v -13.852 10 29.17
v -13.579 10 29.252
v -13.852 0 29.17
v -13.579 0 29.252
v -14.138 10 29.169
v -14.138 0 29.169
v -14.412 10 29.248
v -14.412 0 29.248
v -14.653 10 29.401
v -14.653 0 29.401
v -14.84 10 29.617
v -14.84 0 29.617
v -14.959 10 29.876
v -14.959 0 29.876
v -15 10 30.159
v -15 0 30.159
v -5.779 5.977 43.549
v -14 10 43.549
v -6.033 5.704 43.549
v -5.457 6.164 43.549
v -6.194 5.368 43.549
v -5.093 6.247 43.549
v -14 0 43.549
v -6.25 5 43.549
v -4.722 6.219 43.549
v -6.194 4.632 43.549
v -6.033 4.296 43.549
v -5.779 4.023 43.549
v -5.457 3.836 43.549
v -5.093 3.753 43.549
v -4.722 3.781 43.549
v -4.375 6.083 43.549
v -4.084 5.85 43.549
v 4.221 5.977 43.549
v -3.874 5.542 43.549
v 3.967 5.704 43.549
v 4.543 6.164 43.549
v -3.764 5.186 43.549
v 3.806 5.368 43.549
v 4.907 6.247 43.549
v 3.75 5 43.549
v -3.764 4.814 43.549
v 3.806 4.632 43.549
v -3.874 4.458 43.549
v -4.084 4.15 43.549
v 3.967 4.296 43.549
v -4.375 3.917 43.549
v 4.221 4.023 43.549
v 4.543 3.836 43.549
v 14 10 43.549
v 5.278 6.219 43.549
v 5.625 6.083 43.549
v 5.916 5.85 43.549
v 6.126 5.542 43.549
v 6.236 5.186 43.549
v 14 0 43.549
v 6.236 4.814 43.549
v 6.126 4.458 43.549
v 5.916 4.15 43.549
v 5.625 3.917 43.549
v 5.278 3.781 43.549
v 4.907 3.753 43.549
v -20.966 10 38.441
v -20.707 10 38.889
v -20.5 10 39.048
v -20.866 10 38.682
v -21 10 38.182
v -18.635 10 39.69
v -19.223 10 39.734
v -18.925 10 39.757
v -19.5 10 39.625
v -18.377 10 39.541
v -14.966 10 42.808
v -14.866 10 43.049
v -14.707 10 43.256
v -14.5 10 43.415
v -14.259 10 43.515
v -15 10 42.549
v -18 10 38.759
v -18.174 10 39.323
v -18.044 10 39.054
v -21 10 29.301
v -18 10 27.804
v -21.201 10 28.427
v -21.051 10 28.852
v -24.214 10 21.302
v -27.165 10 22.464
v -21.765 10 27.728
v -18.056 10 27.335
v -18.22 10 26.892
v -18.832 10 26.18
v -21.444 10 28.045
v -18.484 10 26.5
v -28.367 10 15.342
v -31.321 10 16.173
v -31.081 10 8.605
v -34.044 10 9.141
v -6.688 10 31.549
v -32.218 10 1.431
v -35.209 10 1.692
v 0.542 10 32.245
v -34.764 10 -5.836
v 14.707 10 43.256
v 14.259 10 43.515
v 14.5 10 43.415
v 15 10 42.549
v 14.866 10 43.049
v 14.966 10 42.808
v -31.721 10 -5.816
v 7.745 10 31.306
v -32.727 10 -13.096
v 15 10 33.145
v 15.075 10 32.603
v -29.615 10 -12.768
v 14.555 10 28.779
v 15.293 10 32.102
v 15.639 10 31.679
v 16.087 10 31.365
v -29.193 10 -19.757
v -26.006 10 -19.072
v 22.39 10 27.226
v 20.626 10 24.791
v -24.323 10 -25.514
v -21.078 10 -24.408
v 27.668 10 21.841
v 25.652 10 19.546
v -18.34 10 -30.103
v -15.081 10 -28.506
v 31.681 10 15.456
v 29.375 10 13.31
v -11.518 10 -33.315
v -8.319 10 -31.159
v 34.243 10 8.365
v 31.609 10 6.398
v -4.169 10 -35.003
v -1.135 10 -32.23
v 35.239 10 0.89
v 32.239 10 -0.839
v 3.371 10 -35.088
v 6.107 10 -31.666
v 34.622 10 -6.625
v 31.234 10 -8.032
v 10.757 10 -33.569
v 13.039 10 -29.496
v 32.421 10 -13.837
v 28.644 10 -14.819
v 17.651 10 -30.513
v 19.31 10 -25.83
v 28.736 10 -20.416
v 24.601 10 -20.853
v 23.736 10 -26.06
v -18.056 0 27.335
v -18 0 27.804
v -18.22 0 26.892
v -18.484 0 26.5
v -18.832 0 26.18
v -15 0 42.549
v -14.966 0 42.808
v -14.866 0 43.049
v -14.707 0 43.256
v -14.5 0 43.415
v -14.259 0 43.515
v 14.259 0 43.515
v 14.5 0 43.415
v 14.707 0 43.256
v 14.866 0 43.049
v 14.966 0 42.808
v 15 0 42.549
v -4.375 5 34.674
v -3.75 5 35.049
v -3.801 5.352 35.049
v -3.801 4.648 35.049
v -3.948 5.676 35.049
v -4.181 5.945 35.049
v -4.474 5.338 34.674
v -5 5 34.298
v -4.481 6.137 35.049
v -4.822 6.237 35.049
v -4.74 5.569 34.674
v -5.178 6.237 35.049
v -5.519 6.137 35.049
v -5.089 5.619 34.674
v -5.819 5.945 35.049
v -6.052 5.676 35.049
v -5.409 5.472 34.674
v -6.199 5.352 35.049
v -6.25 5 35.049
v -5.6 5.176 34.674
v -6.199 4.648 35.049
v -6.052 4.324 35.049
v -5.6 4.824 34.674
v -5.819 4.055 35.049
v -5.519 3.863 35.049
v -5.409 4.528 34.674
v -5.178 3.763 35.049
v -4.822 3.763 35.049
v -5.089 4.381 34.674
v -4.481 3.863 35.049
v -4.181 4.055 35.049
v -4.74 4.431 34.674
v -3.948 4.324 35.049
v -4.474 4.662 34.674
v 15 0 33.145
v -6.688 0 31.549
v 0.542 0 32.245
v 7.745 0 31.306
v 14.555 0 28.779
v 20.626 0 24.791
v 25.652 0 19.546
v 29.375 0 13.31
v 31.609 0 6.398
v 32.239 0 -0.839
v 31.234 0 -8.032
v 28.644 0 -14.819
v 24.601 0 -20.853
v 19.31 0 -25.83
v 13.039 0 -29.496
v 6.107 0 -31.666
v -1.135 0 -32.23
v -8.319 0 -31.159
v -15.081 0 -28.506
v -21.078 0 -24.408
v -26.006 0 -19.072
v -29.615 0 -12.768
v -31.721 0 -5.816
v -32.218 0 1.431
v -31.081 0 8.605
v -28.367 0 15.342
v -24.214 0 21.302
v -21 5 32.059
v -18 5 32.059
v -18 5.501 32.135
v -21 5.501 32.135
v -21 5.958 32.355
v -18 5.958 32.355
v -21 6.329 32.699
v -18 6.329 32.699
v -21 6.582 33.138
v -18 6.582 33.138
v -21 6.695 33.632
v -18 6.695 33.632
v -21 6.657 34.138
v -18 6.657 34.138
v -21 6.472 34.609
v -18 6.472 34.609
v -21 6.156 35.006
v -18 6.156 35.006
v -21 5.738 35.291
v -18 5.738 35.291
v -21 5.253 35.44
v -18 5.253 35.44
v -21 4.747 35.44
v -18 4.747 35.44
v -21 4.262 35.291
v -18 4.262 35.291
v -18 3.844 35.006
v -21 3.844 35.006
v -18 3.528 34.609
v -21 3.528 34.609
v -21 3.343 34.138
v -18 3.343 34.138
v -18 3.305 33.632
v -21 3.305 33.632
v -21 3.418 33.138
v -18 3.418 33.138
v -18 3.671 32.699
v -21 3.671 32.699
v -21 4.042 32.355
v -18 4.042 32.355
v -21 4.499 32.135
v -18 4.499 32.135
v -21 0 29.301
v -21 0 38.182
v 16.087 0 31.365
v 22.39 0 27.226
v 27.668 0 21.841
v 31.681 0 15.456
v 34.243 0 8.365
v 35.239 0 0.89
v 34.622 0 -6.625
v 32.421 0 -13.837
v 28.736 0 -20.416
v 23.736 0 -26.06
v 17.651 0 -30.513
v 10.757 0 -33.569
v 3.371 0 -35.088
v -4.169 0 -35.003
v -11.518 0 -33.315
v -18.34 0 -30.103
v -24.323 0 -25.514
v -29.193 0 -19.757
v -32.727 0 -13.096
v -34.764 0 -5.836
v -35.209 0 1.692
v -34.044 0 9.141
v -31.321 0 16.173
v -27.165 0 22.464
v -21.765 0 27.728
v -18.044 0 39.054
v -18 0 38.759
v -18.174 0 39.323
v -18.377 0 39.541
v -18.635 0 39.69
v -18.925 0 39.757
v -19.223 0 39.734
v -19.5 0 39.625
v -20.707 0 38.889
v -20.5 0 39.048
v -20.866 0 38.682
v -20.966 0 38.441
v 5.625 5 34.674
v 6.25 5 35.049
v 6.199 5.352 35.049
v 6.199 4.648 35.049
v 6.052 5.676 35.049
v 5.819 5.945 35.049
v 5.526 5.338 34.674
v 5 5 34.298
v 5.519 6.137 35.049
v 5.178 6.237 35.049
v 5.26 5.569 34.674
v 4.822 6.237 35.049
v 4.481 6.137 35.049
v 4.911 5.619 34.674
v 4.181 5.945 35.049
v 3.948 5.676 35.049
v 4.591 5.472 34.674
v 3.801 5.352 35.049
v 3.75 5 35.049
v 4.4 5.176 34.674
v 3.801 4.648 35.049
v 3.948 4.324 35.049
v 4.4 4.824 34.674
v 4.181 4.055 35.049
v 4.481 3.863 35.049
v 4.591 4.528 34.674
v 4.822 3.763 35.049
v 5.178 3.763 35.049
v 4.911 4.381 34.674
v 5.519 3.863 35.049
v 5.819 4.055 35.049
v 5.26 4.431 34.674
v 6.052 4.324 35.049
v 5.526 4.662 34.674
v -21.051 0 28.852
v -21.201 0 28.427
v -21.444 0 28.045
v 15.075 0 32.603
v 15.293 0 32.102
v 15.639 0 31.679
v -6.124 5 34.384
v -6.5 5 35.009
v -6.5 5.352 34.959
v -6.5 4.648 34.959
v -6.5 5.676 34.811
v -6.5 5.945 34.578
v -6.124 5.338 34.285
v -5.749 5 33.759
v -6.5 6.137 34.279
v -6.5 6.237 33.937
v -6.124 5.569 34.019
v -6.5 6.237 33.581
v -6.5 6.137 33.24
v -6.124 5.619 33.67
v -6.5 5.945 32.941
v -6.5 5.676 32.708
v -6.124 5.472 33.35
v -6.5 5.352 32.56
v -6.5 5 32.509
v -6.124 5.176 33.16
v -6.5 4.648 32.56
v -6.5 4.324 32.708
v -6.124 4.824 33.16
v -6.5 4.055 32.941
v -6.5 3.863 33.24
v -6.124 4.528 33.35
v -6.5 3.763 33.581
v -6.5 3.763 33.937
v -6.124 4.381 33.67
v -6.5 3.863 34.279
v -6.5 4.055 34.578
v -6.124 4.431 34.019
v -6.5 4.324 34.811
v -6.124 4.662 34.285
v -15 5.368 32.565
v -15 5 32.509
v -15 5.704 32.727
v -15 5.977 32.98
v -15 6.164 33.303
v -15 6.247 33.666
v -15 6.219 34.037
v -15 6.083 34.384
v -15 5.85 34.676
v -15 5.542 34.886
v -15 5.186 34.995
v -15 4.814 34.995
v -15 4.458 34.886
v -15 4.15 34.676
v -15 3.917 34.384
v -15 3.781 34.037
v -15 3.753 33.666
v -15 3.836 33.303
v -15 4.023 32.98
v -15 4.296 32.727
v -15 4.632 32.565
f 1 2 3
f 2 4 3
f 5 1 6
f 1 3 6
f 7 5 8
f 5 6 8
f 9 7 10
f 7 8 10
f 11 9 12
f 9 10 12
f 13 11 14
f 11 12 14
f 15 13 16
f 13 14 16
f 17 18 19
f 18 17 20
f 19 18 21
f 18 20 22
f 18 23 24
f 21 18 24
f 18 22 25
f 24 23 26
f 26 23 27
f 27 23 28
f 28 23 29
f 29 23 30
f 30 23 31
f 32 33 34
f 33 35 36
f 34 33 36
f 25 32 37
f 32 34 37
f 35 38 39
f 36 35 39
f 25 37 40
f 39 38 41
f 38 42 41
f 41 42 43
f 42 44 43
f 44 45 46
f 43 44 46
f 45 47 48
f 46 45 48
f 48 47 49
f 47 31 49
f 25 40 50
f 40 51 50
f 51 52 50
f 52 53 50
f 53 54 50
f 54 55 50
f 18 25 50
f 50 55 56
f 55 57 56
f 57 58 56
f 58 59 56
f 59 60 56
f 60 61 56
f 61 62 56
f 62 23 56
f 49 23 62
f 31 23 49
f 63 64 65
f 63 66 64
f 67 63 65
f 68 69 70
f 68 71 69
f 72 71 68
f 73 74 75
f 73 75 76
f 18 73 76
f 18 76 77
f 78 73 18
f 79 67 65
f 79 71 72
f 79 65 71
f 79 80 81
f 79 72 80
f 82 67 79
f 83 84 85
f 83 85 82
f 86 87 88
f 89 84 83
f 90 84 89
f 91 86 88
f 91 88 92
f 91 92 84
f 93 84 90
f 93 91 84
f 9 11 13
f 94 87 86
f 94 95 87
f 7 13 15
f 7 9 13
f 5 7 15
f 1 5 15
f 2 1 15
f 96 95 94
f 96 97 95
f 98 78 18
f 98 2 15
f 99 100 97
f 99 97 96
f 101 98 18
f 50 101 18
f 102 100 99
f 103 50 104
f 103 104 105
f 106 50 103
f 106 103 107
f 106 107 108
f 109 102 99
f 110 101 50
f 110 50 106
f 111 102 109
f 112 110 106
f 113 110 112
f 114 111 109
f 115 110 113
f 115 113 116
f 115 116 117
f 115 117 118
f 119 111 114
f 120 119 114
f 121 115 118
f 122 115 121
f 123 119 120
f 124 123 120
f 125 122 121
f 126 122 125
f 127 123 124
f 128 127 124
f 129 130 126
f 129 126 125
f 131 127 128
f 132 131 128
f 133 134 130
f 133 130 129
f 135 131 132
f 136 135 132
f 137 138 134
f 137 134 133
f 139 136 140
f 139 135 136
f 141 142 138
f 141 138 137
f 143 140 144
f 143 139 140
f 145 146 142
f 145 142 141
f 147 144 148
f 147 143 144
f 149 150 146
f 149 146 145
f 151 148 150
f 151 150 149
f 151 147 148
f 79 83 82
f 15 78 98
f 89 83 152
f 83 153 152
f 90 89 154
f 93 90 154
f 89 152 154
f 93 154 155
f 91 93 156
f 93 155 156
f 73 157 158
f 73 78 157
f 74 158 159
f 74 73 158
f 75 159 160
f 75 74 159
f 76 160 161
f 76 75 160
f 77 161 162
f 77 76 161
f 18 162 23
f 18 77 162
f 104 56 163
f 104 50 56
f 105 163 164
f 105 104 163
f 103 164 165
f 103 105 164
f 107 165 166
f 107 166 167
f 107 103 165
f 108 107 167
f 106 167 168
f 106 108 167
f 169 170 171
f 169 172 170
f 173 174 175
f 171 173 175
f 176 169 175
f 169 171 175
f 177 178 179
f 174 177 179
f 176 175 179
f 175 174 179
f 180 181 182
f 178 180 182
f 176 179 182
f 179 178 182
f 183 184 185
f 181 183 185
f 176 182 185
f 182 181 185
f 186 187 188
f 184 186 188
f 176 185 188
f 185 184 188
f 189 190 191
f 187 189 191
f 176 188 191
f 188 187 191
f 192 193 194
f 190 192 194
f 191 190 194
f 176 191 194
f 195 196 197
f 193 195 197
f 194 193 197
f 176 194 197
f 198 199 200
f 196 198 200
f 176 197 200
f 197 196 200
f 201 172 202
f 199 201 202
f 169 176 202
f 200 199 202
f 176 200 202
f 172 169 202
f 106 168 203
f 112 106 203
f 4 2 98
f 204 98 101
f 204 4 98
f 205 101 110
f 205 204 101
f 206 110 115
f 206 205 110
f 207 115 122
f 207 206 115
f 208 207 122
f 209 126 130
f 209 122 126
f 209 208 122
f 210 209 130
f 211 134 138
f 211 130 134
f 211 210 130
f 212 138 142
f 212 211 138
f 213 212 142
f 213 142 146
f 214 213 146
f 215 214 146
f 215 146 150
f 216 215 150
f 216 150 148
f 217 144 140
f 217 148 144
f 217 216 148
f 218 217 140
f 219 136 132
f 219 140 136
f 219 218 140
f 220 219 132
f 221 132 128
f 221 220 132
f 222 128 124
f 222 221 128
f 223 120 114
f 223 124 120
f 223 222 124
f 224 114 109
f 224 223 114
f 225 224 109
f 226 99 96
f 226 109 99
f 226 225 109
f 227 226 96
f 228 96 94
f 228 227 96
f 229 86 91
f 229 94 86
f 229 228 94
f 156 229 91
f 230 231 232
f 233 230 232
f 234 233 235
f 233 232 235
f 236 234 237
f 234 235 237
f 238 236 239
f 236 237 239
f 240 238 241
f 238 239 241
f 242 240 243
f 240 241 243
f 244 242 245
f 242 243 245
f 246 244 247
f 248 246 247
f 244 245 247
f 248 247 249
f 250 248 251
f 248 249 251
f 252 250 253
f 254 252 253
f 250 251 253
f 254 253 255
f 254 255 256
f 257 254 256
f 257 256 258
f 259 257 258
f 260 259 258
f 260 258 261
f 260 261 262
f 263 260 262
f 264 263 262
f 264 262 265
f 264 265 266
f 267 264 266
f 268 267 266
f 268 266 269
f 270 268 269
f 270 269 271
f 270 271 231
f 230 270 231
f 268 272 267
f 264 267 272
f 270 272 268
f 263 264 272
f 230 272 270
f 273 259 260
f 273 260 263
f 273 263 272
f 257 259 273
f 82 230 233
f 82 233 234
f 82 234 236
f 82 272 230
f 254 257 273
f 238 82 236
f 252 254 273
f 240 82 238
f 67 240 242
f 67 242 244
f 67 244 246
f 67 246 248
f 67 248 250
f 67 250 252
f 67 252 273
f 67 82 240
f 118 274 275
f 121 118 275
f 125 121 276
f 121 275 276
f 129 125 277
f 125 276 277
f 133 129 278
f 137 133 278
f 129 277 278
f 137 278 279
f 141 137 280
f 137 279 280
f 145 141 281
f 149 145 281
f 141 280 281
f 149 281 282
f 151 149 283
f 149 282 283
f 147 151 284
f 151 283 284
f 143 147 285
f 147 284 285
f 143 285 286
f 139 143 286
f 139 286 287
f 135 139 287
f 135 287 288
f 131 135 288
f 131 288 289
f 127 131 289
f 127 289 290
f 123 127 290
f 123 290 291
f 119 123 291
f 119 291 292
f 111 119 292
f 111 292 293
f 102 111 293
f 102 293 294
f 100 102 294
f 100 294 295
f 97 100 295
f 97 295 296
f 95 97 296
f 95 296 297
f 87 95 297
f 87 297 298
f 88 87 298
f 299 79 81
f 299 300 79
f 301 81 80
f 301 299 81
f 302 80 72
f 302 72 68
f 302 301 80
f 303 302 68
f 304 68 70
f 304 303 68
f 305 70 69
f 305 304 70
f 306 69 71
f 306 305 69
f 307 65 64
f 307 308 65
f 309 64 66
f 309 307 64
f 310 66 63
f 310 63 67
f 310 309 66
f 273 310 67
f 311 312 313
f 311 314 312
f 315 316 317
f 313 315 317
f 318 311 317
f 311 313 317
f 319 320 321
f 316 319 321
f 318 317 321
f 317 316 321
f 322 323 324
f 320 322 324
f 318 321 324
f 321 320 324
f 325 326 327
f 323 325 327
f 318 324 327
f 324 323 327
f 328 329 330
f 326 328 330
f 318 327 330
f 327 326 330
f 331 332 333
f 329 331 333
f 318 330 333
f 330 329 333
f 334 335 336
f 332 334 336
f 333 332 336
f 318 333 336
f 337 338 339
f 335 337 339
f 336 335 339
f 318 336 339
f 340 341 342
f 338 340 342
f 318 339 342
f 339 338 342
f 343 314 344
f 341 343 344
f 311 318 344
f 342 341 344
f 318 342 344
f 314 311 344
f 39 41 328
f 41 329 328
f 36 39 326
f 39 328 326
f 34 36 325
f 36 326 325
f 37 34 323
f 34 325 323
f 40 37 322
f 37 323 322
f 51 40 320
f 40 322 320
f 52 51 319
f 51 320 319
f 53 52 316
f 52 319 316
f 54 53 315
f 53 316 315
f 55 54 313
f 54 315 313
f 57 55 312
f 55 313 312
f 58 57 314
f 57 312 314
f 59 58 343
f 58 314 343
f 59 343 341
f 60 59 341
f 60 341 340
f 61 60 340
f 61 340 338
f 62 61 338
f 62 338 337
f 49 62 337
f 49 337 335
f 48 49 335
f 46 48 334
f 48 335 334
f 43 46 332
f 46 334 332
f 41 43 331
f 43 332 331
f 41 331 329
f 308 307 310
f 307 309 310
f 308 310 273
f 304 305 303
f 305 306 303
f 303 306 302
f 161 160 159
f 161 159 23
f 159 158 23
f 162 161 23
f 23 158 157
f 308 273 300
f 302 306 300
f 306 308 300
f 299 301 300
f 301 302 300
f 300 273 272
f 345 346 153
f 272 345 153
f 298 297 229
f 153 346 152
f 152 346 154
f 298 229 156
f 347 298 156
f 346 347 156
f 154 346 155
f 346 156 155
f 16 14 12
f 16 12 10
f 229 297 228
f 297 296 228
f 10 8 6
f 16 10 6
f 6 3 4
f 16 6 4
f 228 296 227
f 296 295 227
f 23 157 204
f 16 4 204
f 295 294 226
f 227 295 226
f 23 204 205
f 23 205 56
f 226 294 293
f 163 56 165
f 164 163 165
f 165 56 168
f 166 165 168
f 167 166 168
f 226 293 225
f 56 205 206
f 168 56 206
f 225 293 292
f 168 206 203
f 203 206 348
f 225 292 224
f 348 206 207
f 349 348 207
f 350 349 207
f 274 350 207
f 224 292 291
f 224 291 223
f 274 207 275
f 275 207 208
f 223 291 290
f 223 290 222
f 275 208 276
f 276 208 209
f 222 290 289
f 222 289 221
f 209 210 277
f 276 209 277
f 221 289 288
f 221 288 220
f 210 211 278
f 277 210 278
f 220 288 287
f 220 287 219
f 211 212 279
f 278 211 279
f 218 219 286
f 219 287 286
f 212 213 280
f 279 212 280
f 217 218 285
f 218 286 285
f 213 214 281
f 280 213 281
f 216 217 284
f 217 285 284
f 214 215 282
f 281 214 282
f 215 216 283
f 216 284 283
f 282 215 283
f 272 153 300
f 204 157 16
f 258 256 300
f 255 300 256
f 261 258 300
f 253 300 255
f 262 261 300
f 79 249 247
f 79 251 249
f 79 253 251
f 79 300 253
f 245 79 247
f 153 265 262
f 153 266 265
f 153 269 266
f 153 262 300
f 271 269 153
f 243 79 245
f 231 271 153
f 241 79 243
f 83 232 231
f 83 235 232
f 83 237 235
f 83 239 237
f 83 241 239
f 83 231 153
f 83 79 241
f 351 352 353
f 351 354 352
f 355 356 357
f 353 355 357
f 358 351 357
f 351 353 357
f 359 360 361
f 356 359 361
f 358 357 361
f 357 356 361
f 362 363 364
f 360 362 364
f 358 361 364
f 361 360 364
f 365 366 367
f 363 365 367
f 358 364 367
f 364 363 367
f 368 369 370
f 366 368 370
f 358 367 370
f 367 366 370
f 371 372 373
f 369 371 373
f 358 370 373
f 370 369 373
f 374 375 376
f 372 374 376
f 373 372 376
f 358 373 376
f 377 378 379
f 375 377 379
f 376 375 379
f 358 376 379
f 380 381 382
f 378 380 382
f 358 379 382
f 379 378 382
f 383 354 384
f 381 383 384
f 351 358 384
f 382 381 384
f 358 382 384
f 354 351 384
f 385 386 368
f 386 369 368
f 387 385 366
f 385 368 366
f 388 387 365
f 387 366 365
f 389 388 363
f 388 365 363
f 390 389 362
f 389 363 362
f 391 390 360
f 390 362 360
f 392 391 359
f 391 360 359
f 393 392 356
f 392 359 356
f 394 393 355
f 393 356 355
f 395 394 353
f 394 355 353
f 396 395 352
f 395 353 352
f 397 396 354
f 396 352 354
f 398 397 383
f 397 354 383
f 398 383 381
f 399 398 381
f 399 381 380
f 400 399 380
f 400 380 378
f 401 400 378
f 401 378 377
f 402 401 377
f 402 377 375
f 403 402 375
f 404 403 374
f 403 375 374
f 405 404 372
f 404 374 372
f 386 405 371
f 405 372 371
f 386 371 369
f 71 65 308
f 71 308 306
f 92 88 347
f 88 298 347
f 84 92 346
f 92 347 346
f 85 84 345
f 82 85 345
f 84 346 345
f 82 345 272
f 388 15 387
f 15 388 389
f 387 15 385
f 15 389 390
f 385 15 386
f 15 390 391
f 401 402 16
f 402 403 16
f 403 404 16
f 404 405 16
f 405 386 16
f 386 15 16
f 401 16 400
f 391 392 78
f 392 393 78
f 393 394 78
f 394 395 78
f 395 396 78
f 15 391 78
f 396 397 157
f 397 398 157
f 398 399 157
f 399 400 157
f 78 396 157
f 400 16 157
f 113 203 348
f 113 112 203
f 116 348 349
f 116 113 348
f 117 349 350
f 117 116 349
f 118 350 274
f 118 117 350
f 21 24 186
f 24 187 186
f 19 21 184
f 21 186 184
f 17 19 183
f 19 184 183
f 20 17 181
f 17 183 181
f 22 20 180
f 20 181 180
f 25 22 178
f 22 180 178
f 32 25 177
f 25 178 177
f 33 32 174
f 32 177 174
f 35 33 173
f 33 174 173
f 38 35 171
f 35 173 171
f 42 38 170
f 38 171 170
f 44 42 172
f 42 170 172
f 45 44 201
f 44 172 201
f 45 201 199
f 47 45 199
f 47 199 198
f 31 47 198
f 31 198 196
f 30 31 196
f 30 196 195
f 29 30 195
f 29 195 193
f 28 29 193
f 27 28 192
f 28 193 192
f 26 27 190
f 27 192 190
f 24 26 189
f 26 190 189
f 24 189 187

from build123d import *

# Parameters (mm, degrees)
SKETCH_1_R            = 32.25
EXTRUDE_1_DEPTH       = 10
SKETCH_4_W            = 3
SKETCH_4_H            = 8.186725545
CUT_EXTRUDE_2_DEPTH   = 10
EXTRUDE_5_DEPTH       = 10
HOLE_WIZARD_M32_D     = 3.4
HOLE_WIZARD_M32_DEPTH = 3
M3X0_51_D             = 2.5
M3X0_51_DEPTH         = 8.5
M3X0_51_TIP           = 0.751075774
M3X0_52_D             = 2.5
M3X0_52_DEPTH         = 8.5
M3X0_52_TIP           = 0.751075774
FILLET_1_R            = 2
FILLET_2_R            = 1


with BuildPart() as part:
    # Эскиз1 → Бобышка-Вытянуть1 (new body)
    with BuildSketch(Plane(origin=(0, 0, 0), x_dir=(1, 0, 0), z_dir=(0, 1, 0))):
        with BuildLine():
            Line((-15, -31.899255477), (-15, -43.549299466))
            Line((-15, -43.549299466), (15, -43.549299466))
            Line((15, -43.549299466), (15, -31.899255477))
            ThreePointArc((15, -31.899255477), (0, 35.25), (-15, -31.899255477))
        make_face()
        with Locations(Location((0, 0, 0), (0, 0, 270))):
            Circle(SKETCH_1_R, mode=Mode.SUBTRACT)
    extrude(amount=EXTRUDE_1_DEPTH)

    # Эскиз4 → Вырез-Вытянуть2 (cut)
    with BuildSketch(Plane(origin=(0, 10, 0), x_dir=(1, 0, 0), z_dir=(0, 1, 0))):
        with Locations((-16.5, -27.805892705)):
            Rectangle(SKETCH_4_W, SKETCH_4_H)
    extrude(amount=-CUT_EXTRUDE_2_DEPTH, mode=Mode.SUBTRACT)

    # Эскиз11 → Бобышка-Вытянуть5 (add)
    with BuildSketch(Plane(origin=(0, 10, 0), x_dir=(1, 0, 0), z_dir=(0, 1, 0))):
        Polygon((-18, -26.759344162), (-21, -26.759344162), (-21, -38.759344162), (-18, -40.49139497), align=None)
    extrude(amount=-EXTRUDE_5_DEPTH)

    # Отверстие с зазором M32
    with Locations(Plane.ZY.offset(21)):
        with Locations((33.759344162, 5)):
            Hole(HOLE_WIZARD_M32_D / 2, depth=HOLE_WIZARD_M32_DEPTH)

    # Отверстие обработанное метчиком M3x0.51
    with Locations(Plane.ZY.offset(15)):
        with Locations((33.759344162, 5)):
            Hole(M3X0_51_D / 2, depth=M3X0_51_DEPTH)
            with Locations((0, 0, -(M3X0_51_DEPTH + M3X0_51_TIP / 2))):  # 118° drill point
                Cone(0, M3X0_51_D / 2, M3X0_51_TIP, mode=Mode.SUBTRACT)

    # Отверстие обработанное метчиком M3x0.52
    with Locations(Plane.XY.offset(43.549299466)):
        with Locations((-5, 5), (5, 5)):
            Hole(M3X0_52_D / 2, depth=M3X0_52_DEPTH)
            with Locations((0, 0, -(M3X0_52_DEPTH + M3X0_52_TIP / 2))):  # 118° drill point
                Cone(0, M3X0_52_D / 2, M3X0_52_TIP, mode=Mode.SUBTRACT)

    # Скругление1
    fillet_1_edges = [part.edges().sort_by_distance(p)[0] for p in [
        (-18, 5, 26.759344162),
        (-21, 5, 28.311879132),
        (15, 5, 31.899255477),
    ]]
    fillet(fillet_1_edges, radius=FILLET_1_R)

    # Скругление2
    fillet_2_edges = [part.edges().sort_by_distance(p)[0] for p in [
        (-15, 5, 28.549299466),
        (-21, 5, 38.759344162),
        (-18, 5, 40.49139497),
        (-15, 5, 43.549299466),
        (15, 5, 43.549299466),
    ]]
    fillet(fillet_2_edges, radius=FILLET_2_R)


solid = part.part
